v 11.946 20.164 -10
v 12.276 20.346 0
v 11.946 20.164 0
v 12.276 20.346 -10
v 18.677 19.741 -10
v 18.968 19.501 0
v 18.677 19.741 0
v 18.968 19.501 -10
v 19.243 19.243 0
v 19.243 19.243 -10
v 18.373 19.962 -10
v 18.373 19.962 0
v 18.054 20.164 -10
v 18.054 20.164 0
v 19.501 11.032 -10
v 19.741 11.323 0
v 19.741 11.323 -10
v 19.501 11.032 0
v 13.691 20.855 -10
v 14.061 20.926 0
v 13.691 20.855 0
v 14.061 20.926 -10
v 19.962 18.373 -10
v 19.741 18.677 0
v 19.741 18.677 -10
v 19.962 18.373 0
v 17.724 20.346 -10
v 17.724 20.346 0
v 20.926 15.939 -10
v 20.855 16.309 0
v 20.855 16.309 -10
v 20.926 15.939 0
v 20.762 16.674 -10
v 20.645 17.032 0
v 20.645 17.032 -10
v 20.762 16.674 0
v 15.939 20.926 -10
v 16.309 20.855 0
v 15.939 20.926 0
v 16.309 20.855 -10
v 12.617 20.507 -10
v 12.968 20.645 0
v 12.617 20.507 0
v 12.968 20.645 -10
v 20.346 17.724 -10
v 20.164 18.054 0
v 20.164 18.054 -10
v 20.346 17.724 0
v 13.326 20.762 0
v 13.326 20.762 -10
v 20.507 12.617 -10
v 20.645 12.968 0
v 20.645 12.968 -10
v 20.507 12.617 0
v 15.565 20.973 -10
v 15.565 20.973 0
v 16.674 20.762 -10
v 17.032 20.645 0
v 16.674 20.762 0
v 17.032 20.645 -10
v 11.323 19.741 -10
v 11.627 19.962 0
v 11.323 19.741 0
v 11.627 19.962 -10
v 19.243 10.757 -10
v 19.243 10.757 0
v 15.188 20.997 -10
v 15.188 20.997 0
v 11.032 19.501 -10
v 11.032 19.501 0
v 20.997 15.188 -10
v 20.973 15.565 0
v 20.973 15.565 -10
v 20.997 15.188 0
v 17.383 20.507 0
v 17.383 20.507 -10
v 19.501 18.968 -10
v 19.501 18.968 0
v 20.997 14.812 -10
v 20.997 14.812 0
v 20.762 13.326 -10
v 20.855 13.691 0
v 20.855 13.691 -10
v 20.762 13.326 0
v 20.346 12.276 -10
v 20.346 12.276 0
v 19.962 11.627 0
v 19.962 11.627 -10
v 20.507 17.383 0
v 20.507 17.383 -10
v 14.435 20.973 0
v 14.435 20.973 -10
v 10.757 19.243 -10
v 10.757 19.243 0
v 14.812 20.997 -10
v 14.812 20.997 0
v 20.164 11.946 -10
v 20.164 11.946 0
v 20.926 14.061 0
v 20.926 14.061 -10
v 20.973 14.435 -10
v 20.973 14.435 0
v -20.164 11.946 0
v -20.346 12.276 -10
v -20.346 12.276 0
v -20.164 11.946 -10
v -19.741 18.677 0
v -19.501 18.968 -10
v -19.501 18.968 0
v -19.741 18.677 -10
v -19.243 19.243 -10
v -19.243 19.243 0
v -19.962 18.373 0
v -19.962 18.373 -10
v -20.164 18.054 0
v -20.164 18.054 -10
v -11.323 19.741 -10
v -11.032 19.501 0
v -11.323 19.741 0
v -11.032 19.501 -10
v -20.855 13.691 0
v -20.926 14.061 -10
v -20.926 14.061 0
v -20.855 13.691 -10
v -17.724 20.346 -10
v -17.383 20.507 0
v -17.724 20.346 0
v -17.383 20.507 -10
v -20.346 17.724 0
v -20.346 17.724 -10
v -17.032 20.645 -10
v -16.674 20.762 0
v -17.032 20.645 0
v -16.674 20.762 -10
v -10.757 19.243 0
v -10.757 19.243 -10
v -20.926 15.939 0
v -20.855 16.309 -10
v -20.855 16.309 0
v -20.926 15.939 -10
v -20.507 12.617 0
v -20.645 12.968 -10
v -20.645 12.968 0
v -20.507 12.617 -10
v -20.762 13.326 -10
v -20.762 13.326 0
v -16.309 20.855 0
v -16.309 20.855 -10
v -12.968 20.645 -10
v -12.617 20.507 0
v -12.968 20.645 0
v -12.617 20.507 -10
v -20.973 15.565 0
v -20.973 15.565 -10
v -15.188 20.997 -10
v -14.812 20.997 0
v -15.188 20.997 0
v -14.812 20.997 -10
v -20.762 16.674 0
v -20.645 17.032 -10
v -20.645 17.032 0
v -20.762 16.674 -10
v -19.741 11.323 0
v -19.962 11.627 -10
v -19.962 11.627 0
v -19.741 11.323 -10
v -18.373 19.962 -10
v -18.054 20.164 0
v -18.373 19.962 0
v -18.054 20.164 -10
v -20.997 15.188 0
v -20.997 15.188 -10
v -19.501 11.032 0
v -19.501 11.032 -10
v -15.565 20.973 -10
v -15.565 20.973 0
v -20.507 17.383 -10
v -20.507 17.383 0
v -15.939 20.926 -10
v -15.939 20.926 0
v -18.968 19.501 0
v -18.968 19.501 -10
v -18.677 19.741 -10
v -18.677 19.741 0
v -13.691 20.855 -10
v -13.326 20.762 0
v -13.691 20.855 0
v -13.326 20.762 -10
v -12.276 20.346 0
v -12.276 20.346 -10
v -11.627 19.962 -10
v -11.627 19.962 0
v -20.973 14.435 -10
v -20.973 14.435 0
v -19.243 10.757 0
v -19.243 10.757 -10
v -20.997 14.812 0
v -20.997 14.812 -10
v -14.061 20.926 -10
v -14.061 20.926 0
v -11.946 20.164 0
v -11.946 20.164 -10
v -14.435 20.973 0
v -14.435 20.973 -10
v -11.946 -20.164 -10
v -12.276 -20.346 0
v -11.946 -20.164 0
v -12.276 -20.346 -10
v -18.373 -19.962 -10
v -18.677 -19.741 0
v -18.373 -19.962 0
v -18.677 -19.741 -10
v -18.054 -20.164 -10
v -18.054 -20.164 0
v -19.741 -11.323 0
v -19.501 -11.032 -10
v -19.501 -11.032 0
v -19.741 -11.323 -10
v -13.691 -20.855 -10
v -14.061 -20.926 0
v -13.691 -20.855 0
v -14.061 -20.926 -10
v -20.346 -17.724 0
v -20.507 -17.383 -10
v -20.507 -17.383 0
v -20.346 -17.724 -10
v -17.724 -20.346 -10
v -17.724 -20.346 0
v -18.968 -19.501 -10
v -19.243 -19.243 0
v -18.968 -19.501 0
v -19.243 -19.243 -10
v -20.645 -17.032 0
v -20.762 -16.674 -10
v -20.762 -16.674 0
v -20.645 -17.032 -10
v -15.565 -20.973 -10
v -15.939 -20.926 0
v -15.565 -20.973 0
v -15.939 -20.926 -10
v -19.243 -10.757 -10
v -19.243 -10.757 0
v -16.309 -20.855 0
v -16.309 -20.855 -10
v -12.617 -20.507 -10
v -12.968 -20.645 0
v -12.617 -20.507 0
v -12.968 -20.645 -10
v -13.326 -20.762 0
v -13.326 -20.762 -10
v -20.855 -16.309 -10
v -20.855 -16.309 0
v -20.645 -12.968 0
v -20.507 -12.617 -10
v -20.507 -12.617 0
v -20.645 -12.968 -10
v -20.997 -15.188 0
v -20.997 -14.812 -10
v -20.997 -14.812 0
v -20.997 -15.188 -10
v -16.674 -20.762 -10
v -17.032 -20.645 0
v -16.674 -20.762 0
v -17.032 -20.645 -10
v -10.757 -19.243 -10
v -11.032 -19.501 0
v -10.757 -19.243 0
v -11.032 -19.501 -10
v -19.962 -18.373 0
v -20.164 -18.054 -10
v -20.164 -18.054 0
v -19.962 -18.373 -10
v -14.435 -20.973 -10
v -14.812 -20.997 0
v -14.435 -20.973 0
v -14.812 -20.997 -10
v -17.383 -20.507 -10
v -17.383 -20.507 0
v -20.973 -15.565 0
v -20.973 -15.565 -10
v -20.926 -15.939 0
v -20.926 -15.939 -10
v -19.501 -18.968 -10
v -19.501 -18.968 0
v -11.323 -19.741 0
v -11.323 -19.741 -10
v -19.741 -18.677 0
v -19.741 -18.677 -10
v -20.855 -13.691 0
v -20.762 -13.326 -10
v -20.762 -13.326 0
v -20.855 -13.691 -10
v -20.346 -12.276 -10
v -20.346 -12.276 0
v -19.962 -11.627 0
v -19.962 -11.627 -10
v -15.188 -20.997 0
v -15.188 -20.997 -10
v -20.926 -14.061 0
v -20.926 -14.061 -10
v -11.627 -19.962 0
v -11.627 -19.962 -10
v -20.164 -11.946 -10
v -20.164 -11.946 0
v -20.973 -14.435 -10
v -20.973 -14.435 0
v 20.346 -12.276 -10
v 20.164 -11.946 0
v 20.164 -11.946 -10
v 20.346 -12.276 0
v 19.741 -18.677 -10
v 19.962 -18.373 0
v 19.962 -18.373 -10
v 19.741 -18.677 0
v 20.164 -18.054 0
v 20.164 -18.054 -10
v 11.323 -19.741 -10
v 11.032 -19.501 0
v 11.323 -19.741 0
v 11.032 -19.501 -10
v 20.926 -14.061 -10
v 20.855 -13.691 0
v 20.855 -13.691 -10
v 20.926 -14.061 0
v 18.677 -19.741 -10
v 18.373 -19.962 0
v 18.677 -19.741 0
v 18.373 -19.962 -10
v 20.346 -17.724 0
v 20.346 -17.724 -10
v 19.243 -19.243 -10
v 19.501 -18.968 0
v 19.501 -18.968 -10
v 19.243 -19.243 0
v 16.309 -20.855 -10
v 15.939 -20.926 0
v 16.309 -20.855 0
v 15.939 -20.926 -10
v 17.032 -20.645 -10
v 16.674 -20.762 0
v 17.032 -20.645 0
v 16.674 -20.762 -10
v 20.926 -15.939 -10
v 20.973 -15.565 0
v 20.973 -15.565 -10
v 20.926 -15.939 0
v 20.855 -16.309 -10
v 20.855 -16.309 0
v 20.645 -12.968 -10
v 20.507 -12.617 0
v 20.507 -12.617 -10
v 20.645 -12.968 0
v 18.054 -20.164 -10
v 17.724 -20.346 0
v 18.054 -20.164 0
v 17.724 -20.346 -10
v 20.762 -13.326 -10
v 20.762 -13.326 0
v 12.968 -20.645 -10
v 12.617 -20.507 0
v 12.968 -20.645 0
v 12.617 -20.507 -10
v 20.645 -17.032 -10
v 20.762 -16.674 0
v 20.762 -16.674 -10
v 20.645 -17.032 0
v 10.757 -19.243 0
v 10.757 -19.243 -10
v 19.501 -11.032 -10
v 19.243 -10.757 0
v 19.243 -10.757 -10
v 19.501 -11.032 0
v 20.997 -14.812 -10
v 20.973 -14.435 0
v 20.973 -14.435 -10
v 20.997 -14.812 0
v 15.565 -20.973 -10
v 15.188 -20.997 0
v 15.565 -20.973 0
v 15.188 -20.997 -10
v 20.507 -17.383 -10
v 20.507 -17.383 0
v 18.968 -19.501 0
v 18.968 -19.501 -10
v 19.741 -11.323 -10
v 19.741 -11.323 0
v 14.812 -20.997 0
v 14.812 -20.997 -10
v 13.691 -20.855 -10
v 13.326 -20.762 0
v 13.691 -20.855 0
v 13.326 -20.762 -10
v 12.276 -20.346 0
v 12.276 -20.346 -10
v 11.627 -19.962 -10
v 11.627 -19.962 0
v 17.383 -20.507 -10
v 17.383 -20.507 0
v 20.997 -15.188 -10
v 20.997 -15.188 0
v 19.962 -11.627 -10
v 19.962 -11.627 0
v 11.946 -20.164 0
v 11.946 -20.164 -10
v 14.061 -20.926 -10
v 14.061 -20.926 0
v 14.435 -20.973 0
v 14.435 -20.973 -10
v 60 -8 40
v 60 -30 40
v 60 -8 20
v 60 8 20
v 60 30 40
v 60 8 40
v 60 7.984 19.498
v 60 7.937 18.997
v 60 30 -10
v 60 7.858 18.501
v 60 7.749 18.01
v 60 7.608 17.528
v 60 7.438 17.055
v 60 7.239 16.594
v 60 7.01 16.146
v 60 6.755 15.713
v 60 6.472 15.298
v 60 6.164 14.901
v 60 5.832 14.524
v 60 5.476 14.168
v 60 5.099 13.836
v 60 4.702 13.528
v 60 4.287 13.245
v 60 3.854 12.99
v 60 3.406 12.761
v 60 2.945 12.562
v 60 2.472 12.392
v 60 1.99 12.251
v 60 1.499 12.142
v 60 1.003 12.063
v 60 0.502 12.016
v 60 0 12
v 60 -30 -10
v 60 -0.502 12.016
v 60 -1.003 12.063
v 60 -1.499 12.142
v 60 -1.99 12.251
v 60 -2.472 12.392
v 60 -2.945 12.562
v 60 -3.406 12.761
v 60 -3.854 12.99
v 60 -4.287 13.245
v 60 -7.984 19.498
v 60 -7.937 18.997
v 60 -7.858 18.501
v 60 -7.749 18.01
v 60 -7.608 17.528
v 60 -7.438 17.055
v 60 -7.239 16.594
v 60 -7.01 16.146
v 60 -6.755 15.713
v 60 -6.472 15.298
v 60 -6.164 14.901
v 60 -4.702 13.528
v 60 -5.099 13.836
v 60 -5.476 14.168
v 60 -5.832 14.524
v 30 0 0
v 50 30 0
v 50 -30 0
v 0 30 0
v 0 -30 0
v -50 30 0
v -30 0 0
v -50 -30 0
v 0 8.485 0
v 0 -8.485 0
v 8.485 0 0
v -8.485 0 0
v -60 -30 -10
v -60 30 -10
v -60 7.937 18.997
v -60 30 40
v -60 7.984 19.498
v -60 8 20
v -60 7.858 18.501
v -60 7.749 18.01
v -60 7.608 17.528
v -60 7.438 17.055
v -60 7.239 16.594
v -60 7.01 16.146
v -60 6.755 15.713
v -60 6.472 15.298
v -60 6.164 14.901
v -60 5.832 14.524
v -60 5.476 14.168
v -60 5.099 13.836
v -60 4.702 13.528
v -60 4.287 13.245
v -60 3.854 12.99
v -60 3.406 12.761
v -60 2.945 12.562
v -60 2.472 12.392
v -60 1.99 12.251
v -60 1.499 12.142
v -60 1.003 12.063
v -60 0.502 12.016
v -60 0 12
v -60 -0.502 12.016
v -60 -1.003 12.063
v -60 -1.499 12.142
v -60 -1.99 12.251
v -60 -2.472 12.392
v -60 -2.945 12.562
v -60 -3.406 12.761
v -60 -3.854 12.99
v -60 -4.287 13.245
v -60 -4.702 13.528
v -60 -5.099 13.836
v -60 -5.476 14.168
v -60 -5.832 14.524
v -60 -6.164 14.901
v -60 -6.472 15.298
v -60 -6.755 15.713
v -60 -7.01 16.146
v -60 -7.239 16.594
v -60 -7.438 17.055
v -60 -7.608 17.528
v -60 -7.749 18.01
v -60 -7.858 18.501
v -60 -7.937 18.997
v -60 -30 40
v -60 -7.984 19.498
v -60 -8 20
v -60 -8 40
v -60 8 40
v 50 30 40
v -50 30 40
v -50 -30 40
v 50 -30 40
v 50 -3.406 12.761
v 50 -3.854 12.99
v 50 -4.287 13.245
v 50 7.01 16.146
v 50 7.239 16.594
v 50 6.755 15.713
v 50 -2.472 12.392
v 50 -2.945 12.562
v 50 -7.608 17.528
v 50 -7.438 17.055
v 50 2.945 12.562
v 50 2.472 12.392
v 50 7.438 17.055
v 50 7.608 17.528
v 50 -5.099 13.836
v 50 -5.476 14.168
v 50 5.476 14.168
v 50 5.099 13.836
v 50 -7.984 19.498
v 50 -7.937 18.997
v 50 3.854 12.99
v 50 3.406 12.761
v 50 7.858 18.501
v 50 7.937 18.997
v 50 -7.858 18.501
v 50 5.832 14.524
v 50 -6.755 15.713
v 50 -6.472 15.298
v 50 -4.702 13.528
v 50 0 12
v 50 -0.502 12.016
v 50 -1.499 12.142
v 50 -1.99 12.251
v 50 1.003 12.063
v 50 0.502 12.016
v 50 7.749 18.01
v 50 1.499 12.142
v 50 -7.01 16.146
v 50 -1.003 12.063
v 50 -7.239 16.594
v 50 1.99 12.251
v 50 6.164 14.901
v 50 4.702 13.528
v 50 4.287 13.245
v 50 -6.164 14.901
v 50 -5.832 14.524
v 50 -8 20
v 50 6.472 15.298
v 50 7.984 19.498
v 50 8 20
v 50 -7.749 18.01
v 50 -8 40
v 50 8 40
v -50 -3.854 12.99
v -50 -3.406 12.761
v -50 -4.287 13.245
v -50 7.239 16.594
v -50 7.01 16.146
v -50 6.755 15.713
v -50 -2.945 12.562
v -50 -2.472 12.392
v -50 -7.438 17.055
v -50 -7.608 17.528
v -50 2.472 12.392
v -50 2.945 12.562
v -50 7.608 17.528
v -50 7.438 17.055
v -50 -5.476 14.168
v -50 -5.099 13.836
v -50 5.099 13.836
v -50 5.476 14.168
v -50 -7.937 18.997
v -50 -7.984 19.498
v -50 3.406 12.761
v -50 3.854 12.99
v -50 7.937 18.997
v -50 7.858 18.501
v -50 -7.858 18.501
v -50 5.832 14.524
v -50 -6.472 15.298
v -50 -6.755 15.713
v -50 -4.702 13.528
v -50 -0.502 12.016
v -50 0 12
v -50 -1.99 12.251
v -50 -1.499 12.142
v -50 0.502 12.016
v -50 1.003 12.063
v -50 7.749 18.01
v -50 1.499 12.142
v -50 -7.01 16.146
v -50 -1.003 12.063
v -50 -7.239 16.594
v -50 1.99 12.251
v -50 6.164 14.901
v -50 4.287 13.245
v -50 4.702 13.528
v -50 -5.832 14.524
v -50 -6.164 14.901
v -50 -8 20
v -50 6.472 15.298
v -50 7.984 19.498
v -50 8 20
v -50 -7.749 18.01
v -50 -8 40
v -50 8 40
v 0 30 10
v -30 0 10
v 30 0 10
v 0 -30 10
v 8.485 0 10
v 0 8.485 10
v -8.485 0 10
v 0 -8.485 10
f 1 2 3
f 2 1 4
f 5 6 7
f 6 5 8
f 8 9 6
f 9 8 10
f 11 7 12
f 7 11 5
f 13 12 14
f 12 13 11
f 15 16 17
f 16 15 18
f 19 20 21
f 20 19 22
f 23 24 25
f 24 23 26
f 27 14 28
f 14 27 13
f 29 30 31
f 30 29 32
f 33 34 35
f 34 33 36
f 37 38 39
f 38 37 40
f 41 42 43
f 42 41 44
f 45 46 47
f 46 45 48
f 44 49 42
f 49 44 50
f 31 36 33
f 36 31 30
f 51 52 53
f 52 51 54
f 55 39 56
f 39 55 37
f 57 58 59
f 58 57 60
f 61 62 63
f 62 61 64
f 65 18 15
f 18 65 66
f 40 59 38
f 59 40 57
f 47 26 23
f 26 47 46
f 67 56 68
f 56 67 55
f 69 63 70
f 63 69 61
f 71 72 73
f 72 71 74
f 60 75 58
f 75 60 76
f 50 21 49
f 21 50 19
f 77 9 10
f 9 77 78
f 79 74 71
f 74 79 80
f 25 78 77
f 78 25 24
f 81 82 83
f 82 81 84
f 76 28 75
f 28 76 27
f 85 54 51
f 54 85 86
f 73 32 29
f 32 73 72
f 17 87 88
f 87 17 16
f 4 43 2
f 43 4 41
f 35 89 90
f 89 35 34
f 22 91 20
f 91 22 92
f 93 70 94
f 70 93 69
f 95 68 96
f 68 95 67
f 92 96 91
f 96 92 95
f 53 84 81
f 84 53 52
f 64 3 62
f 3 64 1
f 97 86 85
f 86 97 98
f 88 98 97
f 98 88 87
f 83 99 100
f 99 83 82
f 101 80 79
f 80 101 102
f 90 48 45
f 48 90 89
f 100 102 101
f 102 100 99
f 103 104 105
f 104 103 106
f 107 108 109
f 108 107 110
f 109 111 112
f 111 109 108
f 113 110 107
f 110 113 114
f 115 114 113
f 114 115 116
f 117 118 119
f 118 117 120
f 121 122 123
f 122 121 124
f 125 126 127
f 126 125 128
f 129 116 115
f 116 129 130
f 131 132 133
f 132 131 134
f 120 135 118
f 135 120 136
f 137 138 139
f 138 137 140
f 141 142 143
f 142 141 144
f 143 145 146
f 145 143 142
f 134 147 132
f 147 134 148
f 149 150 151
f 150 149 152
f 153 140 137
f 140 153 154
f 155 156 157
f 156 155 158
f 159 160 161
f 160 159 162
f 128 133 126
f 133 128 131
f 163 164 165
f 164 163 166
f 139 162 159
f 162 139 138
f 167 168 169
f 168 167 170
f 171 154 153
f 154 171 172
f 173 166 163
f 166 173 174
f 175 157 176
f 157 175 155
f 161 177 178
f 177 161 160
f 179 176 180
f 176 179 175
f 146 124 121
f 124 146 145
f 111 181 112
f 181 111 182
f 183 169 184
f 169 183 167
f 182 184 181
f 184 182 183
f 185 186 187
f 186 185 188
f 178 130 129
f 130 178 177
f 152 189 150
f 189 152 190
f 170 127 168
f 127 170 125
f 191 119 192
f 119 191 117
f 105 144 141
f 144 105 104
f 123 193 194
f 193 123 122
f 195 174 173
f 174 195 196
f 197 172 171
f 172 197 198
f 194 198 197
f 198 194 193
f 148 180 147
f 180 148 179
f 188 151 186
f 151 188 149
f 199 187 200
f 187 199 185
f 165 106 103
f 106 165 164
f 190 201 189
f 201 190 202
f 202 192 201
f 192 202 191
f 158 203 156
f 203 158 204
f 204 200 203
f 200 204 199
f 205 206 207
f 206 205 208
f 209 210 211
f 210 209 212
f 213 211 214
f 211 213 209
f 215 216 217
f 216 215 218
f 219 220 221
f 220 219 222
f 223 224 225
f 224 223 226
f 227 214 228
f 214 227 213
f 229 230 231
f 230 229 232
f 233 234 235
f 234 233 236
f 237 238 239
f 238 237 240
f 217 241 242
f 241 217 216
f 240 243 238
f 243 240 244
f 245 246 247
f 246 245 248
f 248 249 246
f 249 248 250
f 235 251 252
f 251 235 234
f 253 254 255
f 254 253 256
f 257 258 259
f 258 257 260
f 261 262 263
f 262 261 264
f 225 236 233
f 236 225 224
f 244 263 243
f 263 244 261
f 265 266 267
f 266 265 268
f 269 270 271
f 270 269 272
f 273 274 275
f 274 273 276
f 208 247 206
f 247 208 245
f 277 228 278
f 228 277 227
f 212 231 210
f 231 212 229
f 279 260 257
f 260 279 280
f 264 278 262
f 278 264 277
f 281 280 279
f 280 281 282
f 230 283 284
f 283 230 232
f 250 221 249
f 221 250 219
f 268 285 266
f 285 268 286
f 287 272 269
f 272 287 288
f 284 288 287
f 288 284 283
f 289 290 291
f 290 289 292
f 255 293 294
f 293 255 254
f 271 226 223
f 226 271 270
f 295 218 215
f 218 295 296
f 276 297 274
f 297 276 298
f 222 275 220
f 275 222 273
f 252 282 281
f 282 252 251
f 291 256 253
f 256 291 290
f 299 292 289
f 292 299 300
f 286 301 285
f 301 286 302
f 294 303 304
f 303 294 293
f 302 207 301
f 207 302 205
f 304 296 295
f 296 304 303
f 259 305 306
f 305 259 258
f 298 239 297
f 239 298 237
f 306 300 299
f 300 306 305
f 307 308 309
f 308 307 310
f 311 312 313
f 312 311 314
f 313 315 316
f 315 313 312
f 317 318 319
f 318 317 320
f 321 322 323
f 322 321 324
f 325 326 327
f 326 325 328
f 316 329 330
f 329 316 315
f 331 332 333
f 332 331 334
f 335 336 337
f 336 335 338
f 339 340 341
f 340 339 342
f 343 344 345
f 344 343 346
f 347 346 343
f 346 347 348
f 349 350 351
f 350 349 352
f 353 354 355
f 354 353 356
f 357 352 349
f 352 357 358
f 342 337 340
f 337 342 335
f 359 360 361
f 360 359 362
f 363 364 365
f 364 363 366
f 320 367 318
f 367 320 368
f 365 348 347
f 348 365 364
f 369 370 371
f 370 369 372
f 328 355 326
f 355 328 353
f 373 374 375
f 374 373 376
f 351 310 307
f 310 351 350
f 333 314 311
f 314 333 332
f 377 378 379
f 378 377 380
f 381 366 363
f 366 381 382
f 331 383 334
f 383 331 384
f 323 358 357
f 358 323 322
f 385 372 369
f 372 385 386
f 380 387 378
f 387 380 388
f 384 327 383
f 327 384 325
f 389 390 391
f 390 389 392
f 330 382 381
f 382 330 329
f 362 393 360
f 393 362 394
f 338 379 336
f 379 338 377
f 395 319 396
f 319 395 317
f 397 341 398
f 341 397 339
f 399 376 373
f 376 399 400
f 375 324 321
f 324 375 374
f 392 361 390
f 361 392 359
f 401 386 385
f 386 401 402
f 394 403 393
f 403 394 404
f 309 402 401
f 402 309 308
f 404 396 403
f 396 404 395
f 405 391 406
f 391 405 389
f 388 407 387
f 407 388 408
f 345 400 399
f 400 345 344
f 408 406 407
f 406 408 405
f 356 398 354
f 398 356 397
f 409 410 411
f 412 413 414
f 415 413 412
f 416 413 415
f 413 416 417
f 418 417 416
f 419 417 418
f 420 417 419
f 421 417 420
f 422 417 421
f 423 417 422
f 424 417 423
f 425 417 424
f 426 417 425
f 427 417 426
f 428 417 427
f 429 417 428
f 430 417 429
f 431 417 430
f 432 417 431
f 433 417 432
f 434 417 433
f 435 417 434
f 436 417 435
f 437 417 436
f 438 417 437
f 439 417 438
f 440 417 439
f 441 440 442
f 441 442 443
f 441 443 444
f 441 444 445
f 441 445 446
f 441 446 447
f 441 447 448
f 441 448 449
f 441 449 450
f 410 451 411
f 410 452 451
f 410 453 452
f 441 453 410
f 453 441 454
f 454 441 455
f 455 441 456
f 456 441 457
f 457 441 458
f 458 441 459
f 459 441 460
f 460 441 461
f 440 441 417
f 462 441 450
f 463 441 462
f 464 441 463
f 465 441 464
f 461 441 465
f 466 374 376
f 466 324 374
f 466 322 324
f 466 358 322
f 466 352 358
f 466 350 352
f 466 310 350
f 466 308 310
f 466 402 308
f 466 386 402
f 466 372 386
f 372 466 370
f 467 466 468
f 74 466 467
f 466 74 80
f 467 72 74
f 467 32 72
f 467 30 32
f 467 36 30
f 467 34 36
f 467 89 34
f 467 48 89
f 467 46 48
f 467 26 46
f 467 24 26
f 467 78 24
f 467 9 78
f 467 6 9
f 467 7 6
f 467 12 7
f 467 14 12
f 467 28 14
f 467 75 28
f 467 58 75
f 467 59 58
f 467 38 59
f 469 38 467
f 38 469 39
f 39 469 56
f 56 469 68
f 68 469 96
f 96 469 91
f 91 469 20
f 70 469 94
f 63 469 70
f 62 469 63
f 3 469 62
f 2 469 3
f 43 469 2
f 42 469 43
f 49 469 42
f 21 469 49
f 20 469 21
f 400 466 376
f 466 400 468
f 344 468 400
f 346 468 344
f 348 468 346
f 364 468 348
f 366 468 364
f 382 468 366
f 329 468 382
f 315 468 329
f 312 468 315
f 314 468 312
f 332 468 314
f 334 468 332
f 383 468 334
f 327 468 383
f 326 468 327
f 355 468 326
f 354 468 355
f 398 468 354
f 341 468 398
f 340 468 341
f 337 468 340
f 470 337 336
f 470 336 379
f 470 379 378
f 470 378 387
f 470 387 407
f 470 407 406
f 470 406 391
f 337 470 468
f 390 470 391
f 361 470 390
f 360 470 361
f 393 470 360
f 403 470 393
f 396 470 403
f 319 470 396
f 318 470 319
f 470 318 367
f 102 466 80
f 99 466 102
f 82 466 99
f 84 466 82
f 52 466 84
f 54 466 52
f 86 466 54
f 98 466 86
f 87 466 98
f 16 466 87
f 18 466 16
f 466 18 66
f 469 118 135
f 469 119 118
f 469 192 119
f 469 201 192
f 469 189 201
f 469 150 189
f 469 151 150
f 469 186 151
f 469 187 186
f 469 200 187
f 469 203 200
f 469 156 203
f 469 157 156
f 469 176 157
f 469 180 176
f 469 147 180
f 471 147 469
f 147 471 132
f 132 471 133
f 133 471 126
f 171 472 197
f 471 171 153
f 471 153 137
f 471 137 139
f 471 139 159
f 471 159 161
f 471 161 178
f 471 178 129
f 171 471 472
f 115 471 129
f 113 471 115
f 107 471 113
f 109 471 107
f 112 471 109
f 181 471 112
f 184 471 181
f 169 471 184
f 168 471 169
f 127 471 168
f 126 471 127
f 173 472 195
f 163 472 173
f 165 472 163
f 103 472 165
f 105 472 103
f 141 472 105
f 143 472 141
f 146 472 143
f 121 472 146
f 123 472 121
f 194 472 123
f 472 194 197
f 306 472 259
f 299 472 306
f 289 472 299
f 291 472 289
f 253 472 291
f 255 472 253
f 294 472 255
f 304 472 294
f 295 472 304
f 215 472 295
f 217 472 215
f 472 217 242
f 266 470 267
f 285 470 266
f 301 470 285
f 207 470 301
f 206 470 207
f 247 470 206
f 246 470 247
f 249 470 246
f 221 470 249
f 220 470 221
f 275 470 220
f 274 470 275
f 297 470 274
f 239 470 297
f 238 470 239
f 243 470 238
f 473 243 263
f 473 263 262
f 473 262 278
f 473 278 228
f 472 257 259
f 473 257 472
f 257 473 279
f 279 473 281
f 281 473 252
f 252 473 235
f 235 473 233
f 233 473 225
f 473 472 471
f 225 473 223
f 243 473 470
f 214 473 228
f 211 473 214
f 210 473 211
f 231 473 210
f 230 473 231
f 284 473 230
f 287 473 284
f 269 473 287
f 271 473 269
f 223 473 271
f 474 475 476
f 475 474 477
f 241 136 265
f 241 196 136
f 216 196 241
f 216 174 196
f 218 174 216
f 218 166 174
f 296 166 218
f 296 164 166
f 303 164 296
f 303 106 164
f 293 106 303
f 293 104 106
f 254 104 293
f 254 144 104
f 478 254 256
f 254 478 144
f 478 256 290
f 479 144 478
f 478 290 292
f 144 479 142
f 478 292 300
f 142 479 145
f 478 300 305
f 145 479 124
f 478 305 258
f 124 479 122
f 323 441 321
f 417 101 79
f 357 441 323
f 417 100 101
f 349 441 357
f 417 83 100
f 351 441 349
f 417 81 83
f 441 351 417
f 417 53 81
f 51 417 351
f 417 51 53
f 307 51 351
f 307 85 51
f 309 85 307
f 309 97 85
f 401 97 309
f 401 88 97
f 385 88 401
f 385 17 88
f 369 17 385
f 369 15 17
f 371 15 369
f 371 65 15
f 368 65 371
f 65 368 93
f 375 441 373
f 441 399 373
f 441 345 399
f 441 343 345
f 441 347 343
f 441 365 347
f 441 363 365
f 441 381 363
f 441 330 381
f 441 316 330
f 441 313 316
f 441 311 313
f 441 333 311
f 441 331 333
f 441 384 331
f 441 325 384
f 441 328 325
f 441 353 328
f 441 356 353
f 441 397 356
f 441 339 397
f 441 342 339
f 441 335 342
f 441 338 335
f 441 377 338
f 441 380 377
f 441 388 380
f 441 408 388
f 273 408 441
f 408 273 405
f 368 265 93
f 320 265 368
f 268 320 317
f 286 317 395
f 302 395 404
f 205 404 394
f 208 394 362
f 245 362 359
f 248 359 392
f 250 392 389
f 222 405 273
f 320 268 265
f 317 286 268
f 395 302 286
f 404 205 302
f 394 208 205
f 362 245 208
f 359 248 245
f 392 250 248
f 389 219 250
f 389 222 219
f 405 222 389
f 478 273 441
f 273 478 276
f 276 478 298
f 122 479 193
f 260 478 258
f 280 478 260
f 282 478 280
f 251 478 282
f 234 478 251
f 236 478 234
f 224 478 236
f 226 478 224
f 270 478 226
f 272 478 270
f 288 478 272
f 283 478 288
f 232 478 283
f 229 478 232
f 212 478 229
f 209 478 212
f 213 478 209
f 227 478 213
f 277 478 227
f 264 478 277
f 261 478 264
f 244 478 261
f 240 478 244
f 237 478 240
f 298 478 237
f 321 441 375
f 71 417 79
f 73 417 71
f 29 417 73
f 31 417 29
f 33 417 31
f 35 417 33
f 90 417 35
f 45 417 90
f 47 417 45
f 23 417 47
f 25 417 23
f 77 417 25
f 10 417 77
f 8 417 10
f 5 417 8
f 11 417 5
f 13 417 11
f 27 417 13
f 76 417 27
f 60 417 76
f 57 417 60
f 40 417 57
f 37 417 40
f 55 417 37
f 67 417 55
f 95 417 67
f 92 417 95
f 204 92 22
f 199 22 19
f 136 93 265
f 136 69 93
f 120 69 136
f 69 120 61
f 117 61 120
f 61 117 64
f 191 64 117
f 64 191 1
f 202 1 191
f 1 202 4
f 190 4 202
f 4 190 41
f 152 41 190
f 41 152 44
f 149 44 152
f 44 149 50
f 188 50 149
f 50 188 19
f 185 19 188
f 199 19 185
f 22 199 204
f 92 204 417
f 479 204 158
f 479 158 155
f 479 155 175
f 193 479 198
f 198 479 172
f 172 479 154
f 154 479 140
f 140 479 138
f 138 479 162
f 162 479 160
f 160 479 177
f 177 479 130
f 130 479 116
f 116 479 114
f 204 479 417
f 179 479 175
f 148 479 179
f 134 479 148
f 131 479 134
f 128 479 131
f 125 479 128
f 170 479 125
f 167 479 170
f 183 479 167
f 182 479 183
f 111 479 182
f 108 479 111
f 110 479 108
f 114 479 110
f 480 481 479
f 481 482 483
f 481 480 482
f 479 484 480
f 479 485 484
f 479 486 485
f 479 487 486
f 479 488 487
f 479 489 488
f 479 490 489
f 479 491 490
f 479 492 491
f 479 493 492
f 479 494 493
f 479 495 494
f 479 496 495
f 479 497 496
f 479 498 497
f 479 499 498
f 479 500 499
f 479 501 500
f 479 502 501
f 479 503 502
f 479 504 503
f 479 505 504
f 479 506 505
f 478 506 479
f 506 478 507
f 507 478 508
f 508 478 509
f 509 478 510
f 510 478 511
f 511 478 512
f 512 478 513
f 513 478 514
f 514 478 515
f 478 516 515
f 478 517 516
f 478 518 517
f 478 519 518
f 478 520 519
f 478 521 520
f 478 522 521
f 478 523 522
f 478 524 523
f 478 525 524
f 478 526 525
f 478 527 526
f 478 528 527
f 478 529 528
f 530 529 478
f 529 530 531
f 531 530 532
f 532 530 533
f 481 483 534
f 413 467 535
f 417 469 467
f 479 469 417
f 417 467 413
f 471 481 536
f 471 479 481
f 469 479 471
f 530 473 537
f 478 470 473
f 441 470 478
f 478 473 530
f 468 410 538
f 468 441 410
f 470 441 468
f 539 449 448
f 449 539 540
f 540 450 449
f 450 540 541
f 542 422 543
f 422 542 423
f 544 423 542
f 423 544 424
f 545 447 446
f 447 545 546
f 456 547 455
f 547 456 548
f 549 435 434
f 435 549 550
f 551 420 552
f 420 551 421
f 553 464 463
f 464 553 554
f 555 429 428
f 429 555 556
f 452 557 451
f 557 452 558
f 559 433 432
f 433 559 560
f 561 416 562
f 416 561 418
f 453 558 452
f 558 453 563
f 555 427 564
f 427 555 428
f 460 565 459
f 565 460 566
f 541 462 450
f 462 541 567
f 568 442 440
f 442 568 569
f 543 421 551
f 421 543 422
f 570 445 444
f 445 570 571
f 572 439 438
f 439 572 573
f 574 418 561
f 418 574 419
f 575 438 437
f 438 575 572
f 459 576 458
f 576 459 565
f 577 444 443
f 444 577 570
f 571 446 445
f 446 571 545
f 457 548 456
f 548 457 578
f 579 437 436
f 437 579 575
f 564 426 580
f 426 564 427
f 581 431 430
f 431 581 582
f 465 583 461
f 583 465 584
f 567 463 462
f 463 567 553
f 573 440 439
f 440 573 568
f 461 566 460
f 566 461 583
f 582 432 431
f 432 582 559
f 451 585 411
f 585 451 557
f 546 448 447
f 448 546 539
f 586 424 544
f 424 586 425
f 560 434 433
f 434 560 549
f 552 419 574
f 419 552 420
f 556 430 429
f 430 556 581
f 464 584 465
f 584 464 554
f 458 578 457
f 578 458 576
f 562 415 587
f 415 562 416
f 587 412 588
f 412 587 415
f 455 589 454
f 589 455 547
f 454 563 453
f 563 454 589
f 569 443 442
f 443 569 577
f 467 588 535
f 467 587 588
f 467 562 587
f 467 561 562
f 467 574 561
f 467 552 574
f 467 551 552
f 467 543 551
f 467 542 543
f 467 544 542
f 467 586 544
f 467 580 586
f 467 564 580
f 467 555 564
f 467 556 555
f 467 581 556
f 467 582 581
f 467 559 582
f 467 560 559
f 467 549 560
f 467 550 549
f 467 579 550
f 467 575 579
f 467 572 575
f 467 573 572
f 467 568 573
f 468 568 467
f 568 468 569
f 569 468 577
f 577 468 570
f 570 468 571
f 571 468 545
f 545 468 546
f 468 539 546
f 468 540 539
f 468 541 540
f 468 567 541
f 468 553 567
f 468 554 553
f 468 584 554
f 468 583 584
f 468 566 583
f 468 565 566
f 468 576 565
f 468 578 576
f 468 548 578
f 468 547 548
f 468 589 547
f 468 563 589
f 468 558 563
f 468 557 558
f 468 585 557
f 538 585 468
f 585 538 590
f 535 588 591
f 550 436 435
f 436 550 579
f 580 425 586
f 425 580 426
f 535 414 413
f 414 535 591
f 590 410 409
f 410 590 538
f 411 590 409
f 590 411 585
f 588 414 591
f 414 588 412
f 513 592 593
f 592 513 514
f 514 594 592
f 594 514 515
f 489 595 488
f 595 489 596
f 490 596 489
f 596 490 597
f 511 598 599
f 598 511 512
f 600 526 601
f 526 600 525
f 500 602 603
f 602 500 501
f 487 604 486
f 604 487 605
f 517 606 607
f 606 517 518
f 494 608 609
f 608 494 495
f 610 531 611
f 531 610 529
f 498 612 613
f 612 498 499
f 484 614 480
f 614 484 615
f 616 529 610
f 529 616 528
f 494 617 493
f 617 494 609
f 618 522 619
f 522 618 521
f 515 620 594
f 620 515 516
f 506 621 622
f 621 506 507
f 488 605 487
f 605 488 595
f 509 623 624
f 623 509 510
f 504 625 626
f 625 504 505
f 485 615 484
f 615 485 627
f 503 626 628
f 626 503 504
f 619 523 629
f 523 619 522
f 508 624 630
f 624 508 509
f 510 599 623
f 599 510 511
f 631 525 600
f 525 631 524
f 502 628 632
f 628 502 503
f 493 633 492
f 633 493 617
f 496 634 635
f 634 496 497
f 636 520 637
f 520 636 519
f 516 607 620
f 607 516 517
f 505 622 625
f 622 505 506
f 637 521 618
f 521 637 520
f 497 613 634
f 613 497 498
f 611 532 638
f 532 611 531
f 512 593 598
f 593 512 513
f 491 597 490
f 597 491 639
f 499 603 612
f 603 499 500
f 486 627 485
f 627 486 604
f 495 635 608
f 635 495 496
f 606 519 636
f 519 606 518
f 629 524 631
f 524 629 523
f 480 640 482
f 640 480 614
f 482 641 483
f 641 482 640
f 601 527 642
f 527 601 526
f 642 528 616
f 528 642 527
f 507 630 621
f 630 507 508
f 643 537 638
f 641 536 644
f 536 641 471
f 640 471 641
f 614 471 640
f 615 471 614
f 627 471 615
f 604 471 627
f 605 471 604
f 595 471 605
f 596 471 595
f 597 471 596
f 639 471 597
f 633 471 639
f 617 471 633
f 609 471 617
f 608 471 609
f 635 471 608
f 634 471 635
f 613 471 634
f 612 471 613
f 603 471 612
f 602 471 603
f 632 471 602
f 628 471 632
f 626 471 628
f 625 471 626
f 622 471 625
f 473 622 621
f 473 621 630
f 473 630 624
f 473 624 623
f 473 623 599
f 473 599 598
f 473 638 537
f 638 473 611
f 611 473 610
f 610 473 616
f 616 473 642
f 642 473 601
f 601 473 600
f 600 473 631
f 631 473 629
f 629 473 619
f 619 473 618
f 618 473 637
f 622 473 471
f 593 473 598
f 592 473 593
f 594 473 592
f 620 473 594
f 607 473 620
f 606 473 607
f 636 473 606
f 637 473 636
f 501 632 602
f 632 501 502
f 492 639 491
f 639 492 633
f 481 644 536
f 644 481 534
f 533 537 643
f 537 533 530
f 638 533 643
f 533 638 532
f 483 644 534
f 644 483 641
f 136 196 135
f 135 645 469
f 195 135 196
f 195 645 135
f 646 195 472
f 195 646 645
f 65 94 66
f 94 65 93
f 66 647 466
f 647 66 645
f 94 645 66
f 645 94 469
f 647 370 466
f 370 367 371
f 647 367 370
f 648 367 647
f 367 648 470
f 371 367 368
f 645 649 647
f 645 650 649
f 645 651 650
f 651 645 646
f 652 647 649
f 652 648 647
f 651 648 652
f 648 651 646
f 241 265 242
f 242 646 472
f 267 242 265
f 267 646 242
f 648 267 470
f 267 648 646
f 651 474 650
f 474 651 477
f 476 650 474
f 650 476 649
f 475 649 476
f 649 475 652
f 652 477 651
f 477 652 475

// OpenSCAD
$fn=100;
mm=1; // define units
degrees=1;

include <../lib.scad>

p1=$preview?1+1/$fn:1;// A "one" over-cut for prettier previews.
module example_142(){
	length=120;
	width=60;
	end_stop_thickness=10;
	thickness=10;
	module base()
		difference(){
			Cube([length,width,thickness],center=X+Y+2*Z);
			rotate(45*degrees*Z)
				set(4,r=width/sqrt(2)/2)
					translate(-thickness*Z)
						wcylinder(r=6,h=thickness);}
	module walls(){
		height=40;
		difference(){
			Cube([end_stop_thickness,width,height],
				center=Y);
			translate(height*Z)
				rotate(90*Y)
					arch(r=8,h=28,t=end_stop_thickness,bottom_edge=true);}}
	module square_facet()
		// Assuming the central hole doesn't go though the bottom plate.
		translate(-thickness*Z)
			//TODO: Replace with =center= when that exists on annulus.
			annulus(ro=width/2,ri=6*sqrt(2),h=thickness*2,$fn=4);
	base();
	pair(r=length/2-end_stop_thickness)
		walls();
	square_facet();}

example_142();
